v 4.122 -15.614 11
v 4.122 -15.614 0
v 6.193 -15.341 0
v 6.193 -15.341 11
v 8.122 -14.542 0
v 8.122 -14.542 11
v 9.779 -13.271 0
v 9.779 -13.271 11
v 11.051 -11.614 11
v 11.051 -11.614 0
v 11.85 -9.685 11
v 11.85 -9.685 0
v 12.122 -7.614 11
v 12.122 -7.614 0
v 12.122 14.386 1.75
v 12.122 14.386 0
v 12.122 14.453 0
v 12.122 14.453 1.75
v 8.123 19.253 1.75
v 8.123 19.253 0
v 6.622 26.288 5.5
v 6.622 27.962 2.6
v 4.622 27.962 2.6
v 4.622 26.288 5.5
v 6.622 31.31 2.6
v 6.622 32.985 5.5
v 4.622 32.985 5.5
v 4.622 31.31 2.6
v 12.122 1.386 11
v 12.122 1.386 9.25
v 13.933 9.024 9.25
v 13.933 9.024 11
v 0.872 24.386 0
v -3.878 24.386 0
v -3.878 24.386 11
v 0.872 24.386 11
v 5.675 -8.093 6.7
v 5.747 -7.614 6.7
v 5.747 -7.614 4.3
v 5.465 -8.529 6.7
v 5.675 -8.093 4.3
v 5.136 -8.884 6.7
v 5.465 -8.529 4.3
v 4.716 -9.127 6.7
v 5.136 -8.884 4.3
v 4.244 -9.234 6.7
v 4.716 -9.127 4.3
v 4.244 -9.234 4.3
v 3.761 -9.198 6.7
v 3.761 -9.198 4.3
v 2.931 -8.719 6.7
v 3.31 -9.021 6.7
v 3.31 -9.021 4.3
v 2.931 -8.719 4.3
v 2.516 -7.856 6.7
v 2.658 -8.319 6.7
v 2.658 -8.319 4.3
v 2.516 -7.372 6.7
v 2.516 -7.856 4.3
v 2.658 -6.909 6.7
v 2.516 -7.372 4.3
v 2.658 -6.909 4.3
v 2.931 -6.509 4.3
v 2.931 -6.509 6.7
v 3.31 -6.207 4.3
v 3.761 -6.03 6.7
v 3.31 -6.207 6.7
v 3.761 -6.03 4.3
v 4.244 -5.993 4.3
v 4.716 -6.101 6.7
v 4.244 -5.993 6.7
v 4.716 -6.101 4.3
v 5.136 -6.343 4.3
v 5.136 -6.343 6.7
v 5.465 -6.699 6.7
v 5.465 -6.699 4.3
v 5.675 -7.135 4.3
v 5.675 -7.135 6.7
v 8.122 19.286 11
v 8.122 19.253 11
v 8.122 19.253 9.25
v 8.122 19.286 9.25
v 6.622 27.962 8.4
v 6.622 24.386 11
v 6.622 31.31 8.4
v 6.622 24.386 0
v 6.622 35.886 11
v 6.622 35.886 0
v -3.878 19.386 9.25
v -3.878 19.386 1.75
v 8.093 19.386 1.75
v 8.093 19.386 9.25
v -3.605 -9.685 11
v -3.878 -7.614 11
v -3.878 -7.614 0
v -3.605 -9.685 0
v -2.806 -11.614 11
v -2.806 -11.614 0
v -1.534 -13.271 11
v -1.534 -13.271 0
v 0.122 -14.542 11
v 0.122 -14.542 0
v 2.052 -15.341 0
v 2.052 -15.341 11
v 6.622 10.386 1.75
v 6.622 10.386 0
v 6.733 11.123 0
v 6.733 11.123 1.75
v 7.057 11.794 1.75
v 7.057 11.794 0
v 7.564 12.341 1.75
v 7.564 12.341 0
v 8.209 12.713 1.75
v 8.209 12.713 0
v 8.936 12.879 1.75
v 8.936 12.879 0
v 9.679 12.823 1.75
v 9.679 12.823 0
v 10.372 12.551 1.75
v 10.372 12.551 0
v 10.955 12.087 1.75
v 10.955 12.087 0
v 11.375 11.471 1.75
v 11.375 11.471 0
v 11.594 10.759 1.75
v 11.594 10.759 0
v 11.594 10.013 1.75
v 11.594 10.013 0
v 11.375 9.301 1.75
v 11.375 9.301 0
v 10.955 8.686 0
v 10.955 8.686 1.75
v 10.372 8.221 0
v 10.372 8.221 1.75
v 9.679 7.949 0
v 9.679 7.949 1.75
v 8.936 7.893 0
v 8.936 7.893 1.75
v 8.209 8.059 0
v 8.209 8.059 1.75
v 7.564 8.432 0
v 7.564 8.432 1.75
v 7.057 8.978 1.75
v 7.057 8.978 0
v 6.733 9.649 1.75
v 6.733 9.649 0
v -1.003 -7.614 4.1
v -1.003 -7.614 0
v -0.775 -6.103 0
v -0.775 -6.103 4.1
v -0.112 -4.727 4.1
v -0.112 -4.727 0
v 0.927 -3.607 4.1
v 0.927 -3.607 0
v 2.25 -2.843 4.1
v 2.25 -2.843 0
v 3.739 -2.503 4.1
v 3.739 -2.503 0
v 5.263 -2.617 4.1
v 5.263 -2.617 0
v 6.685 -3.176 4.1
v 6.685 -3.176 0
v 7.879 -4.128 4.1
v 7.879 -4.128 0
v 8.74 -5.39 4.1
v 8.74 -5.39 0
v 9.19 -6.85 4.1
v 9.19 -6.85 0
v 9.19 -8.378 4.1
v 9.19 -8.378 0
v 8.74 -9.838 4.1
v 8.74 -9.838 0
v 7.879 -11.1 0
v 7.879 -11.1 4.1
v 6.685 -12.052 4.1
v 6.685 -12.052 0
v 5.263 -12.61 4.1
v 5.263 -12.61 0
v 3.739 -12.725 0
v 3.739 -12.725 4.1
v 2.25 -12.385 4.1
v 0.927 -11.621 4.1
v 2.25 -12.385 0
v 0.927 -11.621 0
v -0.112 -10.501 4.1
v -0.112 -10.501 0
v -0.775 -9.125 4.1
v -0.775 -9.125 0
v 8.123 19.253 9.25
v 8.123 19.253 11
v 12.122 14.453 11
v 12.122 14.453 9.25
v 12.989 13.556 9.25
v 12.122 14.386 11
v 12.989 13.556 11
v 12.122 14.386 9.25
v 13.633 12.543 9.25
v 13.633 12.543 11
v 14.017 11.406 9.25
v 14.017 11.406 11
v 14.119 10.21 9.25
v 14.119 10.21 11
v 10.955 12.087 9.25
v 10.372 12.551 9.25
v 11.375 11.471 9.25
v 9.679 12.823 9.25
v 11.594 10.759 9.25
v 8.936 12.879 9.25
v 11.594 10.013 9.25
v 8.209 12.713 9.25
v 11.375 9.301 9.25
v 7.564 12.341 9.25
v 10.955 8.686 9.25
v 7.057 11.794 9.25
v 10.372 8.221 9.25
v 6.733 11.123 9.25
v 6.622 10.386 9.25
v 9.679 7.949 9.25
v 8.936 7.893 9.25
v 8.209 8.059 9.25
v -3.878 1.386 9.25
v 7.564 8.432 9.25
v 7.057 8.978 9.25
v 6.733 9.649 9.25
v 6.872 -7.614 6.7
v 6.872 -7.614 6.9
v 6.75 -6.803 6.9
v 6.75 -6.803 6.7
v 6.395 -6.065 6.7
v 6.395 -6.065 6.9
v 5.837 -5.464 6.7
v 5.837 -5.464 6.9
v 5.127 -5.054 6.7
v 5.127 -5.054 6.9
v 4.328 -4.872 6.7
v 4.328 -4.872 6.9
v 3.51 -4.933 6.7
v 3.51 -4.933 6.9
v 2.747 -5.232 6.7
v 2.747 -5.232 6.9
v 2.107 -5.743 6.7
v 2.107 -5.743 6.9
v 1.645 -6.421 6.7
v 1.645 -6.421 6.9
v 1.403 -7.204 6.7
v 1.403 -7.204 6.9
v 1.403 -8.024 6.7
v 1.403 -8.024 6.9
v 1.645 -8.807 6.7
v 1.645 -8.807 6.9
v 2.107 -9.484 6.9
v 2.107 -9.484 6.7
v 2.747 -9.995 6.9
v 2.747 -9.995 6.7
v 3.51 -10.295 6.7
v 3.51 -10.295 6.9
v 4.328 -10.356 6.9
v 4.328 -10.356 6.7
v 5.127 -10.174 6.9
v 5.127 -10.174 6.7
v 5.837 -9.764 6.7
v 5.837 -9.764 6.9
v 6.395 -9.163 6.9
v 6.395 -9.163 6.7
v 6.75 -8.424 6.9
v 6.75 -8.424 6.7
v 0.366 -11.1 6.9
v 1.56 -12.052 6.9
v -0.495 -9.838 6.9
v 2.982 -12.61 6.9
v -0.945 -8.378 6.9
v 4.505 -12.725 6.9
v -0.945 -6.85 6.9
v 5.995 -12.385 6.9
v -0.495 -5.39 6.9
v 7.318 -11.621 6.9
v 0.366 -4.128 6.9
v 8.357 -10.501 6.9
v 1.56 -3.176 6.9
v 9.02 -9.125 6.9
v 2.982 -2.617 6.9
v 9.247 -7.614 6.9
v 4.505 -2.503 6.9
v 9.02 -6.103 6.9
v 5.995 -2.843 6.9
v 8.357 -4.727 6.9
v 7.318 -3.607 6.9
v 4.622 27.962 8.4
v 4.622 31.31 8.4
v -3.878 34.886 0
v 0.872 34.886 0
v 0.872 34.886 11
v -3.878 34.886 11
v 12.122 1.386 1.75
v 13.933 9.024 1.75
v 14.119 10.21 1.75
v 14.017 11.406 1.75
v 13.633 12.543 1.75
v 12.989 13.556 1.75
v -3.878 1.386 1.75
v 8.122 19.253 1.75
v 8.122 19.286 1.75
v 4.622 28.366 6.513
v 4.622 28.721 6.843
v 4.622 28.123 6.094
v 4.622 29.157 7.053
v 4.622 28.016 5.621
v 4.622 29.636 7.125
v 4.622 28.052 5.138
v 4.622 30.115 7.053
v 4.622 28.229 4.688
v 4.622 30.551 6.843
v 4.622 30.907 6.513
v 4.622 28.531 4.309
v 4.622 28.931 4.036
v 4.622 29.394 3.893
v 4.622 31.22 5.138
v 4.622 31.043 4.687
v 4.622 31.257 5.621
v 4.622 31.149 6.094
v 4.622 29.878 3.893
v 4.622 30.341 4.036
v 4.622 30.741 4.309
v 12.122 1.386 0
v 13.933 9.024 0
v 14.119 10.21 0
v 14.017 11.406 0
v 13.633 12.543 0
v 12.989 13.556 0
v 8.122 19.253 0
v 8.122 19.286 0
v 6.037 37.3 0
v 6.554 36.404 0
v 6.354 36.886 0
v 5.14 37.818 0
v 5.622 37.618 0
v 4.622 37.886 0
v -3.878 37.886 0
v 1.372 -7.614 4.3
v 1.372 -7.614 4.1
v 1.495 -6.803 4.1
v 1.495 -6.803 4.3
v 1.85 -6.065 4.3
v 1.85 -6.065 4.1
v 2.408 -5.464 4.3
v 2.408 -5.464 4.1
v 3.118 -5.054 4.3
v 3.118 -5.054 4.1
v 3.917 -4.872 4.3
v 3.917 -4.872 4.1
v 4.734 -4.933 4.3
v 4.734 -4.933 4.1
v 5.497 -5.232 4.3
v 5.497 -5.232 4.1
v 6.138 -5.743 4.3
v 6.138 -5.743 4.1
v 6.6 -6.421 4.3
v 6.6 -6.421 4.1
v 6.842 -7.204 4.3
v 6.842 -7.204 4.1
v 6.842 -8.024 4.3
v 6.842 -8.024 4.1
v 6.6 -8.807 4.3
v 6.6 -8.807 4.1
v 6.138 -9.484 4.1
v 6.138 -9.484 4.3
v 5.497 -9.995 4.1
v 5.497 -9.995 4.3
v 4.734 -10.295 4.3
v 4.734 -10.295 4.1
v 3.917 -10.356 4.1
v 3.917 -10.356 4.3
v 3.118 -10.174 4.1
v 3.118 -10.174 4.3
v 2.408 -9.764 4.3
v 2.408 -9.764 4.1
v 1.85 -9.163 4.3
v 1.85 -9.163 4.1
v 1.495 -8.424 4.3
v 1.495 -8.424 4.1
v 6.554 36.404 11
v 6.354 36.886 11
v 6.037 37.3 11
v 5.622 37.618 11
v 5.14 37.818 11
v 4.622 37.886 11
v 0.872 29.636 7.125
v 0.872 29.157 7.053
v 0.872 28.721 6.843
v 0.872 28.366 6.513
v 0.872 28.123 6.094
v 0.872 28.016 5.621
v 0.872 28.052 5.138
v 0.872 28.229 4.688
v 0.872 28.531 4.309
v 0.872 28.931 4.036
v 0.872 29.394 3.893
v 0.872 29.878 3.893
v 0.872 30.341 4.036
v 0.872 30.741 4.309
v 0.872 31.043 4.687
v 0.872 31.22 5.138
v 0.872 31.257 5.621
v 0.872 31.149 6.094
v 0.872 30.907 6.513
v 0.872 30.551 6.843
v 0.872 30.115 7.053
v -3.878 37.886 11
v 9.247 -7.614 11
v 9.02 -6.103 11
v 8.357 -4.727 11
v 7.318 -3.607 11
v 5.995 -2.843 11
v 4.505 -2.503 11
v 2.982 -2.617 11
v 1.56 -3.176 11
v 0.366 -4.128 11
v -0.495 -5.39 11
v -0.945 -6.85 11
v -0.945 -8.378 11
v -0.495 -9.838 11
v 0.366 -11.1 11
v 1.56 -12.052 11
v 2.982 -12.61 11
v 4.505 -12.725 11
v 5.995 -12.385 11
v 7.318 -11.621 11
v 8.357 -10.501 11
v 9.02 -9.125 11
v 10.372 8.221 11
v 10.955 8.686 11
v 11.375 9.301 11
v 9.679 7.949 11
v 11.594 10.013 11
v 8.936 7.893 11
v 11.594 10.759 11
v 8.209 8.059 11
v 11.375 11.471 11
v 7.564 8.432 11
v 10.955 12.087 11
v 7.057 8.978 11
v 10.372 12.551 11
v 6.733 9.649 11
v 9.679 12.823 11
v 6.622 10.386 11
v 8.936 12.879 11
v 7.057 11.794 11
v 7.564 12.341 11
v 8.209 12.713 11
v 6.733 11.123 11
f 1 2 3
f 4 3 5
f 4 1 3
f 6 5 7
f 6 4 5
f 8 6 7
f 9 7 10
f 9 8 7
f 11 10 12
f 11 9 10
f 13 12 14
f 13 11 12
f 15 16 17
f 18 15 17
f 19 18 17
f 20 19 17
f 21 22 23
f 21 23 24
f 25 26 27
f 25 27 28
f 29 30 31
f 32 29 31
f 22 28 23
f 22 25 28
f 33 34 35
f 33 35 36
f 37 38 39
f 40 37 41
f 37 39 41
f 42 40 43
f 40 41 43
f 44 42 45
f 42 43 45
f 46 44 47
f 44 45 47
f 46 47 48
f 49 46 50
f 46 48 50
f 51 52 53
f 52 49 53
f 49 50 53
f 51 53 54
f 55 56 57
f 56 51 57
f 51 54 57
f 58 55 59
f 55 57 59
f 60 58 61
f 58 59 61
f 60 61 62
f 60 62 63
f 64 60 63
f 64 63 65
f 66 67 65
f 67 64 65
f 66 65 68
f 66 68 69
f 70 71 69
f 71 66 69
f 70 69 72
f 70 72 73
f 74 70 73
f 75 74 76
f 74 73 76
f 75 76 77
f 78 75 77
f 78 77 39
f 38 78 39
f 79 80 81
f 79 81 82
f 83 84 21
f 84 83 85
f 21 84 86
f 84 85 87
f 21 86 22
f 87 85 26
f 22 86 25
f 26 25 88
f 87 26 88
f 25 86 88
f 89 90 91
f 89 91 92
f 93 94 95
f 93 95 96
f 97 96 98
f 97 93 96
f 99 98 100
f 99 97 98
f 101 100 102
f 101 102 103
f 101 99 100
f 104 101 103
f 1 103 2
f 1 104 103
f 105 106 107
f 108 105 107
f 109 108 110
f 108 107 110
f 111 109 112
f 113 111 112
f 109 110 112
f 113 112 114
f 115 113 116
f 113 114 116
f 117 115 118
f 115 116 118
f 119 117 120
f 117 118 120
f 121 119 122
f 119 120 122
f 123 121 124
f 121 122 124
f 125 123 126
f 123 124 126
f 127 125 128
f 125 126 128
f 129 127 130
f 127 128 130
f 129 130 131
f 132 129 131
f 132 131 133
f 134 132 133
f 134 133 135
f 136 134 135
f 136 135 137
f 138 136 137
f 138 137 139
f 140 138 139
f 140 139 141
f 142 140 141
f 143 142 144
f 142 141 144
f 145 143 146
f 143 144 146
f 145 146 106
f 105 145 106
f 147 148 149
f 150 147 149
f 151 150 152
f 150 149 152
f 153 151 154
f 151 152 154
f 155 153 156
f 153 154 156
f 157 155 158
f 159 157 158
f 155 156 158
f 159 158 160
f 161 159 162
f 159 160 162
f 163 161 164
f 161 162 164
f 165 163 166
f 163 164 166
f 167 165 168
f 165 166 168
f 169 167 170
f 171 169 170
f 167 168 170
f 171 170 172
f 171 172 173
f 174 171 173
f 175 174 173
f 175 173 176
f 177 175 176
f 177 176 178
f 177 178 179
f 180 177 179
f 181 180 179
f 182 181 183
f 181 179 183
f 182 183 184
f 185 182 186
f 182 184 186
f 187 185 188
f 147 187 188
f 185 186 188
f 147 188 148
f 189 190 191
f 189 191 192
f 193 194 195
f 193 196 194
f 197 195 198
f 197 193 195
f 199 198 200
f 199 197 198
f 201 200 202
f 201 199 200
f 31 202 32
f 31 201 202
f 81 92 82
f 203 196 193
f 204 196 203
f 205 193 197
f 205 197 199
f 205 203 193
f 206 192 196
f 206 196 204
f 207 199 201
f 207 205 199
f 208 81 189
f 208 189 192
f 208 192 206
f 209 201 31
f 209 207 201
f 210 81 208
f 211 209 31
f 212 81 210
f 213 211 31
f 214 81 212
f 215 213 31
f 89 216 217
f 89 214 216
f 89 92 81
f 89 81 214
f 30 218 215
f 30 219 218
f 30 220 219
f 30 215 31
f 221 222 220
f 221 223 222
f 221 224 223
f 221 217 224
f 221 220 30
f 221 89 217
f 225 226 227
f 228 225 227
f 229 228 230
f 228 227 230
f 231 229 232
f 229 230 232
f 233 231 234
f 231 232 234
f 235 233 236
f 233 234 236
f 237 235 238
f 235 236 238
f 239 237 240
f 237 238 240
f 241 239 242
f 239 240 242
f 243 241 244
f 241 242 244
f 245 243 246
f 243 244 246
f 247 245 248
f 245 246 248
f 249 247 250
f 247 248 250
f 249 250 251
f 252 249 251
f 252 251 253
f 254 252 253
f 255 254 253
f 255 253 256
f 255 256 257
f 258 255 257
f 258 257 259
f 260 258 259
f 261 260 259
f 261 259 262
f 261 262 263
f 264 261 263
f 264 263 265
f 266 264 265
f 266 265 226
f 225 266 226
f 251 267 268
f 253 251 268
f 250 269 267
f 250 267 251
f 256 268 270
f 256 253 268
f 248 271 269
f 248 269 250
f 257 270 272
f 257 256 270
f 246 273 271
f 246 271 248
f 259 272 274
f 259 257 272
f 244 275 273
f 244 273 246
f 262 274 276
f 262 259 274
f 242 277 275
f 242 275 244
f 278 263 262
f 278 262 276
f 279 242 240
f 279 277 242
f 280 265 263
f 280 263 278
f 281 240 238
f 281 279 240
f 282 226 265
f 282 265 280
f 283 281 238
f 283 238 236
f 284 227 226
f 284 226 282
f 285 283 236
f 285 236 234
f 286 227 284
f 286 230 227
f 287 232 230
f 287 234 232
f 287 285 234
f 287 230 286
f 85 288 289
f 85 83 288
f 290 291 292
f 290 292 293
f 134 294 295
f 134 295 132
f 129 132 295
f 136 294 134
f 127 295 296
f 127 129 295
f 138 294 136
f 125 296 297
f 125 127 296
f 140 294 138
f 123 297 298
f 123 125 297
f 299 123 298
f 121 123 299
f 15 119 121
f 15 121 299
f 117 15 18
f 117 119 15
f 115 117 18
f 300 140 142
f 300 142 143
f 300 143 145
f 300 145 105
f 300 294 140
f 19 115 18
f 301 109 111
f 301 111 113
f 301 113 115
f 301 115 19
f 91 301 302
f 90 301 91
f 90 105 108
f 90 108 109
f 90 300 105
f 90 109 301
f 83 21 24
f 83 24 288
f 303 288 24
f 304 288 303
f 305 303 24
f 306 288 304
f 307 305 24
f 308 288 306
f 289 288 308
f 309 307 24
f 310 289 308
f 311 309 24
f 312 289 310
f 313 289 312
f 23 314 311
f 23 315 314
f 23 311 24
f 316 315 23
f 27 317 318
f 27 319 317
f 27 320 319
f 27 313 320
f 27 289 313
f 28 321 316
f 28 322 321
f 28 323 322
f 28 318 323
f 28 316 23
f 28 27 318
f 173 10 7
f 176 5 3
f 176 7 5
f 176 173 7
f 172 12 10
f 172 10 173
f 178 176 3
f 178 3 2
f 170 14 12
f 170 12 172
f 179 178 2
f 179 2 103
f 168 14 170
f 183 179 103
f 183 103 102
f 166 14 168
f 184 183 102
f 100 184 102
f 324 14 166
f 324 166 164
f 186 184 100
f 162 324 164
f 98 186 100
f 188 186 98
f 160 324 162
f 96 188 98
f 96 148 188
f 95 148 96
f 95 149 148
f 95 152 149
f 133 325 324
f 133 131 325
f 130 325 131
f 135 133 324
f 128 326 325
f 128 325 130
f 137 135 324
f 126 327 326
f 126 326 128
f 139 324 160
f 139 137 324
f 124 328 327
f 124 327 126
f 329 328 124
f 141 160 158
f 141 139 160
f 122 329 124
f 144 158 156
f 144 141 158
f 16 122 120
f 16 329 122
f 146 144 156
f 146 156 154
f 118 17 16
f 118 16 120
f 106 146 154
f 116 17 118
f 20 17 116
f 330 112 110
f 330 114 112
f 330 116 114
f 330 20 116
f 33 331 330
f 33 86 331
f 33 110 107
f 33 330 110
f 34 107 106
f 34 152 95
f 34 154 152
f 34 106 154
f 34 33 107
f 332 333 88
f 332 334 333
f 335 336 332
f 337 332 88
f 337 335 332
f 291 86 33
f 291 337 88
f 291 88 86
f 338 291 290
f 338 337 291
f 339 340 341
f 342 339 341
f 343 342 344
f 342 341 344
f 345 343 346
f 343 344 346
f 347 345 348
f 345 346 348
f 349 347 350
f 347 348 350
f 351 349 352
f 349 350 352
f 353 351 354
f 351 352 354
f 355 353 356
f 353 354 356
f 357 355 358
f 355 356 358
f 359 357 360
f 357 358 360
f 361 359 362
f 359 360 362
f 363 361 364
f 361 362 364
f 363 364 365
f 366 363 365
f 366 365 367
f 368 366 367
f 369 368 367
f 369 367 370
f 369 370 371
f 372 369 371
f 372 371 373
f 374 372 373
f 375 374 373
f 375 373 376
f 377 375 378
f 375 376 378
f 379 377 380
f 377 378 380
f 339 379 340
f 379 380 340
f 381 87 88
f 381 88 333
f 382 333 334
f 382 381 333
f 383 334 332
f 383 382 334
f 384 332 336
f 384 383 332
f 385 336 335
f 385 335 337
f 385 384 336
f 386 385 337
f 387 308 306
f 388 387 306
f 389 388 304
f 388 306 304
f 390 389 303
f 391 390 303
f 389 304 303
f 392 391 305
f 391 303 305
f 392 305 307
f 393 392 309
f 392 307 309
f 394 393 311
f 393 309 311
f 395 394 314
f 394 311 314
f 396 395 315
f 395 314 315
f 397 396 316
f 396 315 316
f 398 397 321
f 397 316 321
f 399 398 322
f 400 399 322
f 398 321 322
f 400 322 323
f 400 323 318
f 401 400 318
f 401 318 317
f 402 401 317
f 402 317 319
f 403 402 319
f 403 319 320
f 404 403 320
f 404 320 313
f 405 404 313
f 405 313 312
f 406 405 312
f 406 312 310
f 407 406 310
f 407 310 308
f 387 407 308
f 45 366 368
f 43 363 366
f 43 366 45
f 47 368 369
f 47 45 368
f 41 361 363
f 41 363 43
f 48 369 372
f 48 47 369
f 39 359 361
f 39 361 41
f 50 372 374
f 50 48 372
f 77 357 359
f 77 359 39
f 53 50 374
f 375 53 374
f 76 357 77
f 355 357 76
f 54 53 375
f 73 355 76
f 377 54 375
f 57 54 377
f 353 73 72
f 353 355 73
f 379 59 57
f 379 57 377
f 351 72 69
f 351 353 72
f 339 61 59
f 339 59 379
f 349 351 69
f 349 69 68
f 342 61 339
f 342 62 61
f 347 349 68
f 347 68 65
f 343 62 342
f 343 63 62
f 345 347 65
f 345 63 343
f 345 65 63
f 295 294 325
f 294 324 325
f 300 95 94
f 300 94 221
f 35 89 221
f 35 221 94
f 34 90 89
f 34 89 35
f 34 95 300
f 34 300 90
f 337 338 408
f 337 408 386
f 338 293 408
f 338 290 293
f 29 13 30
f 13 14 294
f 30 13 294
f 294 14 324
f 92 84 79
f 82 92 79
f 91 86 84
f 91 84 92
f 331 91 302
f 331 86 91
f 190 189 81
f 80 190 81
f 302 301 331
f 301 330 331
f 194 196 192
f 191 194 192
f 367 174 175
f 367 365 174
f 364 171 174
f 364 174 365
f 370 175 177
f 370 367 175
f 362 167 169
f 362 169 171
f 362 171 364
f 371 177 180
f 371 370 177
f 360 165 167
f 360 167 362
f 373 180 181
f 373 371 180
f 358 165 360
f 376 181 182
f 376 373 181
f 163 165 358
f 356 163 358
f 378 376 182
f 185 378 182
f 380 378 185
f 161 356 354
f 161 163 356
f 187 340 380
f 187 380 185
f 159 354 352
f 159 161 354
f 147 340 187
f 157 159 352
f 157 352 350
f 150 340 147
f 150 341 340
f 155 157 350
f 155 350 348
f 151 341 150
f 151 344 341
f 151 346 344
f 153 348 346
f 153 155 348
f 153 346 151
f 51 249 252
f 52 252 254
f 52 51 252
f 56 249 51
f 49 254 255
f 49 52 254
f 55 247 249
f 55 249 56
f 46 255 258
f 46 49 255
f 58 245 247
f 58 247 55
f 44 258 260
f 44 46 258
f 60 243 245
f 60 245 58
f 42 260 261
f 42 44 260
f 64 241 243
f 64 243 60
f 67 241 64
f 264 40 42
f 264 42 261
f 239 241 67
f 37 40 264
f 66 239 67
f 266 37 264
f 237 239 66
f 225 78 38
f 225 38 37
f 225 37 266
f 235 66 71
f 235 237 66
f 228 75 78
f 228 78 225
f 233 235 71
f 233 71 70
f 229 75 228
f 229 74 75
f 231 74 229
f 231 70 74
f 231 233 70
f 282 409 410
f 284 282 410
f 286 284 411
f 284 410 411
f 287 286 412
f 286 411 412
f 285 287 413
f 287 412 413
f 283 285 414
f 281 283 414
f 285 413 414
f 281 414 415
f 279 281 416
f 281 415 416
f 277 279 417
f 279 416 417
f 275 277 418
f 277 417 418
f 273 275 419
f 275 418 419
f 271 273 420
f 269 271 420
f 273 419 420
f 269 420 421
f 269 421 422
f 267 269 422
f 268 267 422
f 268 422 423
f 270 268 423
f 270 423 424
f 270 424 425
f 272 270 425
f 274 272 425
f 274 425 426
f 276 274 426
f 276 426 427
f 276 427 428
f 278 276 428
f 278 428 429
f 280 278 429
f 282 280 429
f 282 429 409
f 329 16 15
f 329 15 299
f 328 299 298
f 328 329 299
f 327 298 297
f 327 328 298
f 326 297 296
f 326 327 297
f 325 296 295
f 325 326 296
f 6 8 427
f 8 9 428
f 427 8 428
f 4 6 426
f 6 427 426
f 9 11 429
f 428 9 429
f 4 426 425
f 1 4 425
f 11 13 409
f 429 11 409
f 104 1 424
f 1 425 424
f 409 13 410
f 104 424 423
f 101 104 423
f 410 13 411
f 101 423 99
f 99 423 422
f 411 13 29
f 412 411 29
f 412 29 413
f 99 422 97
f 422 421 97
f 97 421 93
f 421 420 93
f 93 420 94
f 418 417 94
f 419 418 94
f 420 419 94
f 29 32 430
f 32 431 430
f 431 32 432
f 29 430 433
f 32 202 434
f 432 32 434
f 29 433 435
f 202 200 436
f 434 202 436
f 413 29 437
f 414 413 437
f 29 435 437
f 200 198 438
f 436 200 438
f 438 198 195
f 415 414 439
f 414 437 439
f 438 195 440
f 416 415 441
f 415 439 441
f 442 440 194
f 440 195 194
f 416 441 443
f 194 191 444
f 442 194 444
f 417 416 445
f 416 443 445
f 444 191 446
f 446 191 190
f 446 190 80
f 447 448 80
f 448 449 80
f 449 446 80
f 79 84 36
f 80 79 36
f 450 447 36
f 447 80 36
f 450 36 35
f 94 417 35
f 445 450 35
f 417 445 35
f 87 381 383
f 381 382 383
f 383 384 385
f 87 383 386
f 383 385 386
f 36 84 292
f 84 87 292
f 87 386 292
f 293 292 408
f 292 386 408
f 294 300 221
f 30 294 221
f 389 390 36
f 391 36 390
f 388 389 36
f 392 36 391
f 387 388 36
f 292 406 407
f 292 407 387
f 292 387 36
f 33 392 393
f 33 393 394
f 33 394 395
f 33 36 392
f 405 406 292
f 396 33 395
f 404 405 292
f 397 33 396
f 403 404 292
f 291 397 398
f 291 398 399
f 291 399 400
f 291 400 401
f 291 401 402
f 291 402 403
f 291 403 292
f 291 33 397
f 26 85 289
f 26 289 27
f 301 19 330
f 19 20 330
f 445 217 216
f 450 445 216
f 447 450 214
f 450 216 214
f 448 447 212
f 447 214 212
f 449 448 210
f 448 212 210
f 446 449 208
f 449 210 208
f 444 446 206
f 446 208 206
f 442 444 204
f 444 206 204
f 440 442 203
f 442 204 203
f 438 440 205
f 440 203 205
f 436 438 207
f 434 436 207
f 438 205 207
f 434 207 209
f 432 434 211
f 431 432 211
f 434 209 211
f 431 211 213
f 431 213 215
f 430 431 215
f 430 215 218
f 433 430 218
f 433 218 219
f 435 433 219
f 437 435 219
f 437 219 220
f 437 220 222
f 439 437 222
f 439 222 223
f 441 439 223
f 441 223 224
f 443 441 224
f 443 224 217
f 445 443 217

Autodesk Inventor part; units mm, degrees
ref_plane "YZ Plane" through (0, 0, 0) normal (1, 0, 0) x (0, 1, 0)
ref_plane "XZ Plane" through (0, 0, 0) normal (0, 1, 0) x (-1, 0, 0)
ref_plane "XY Plane" through (0, 0, 0) normal (0, 0, 1) x (1, 0, 0)
sketch "Szkic1" plane through (0, 0, 0) normal (0, 0, 1) x (1, 0, 0)
  line L0 (-3.8776, -15.6139) -> (12.1224, -15.6139)
  line L1 (12.1224, -15.6139) -> (12.1224, 24.3861)
  line L2 (-3.8776, -15.6139) -> (-3.8776, 24.3861)
  line L3 (-3.8776, 24.3861) -> (12.1224, 24.3861)
  circle A0 centre (4.1224, -7.6139) radius 5.075
  circle A1 centre (4.1224, -7.6139) radius 1.625
  point P0 (0, 0)
  dimension "d0" = 16
  dimension "d1" = 40
  dimension "d2" = 8
  dimension "d3" = 10.15
  dimension "d4" = 8
  dimension "d8" = 3.25
extrude "Wyciągnięcie proste1" add sketch "Szkic1" along normal blind 11 contours L2 L3 L1 L0 | A0
fillet "Zaokrąglenie1" radius 8 2 edges at (-3.8776, -15.6139, 5.5) (12.1224, -15.6139, 5.5)
sketch "Szkic2" plane through (0, 0, 0) normal (0, 0, -1) x (-1, 0, 0)
  arc A0 (-12.1224, -7.6139) -> (3.8776, -7.6139) centre (-4.1224, -7.6139) ccw projected
  line L0 (-4.1224, -15.6139) -> (-13.9839, -15.6139)
  line L1 (3.8776, 24.3861) -> (3.8776, -7.6139) projected
  circle A1 centre (-9.1224, 10.3861) radius 2.5
  arc A2 (-12.1224, 14.3861) -> (-12.1224, 6.3861) centre (-9.1224, 10.3861) ccw
  arc A3 (-12.1224, -7.6139) -> (3.8776, -7.6139) centre (-4.1224, -7.6139) ccw projected
  line L2 (3.8776, 24.3861) -> (3.8776, -7.6139) projected
  line L3 (-12.1224, 24.3861) -> (3.8776, 24.3861) projected
  line L4 (-12.1224, -7.6139) -> (-12.1224, 24.3861) projected
  line L5 (-12.1224, -7.6139) -> (-12.1224, 24.3861) projected
  line L6 (-12.1224, 19.2527) -> (-8.1224, 19.2527)
  line L7 (-8.1224, 19.2527) -> (-8.1224, 24.3861)
  line L8 (-12.1224, 24.3861) -> (3.8776, 24.3861) projected
  point P0 (0, 0)
  dimension "d10" = 26
  dimension "d13" = 5
  dimension "d14" = 10
  dimension "d16" = 4
  dimension "d23" = 13
extrude "Wyciągnięcie proste2" add sketch "Szkic2" against normal blind 11 contours A2 L4
extrude "Wyciągnięcie proste3" cut sketch "Szkic2" against normal blind 11.5 contours L4 L3 L7 L6
extrude "Wyciągnięcie proste4" cut sketch "Szkic2" against normal blind 11.5 contours A1
sketch "Szkic3" plane through (-3.8776, 24.3861, 0) normal (-1, 0, 0) x (0, 0, 1)
  line L0 (11, -32) -> (0, -32) projected
  line L1 (11, 0) -> (11, -32) projected
  line L2 (0, 0) -> (11, 0) projected
  line L3 (0, 0) -> (0, -32) projected
  line L4 (1.75, -23) -> (9.25, -23)
  line L5 (1.75, -23) -> (1.75, -5)
  line L6 (1.75, -5) -> (9.25, -5)
  line L7 (9.25, -5) -> (9.25, -23)
  point P0 (0, -24.3861)
  point P1 (5.75, -14)
  dimension "d24" = 14
  dimension "d26" = 9
  dimension "d27" = 7.5
  dimension "d28" = 11
  dimension "d29" = 18
  dimension "d30" = 1.75
extrude "Wyciągnięcie proste5" cut sketch "Szkic3" against normal blind 20 contours L5 L6 L7 L4
chamfer "Faza3" distance 1.5 distance2 5.1 1 edges at (8.1224, 24.3861, 5.5)
sketch "Szkic5" plane through (0, 0, 0) normal (0, 0, -1) x (-1, 0, 0)
  circle A0 centre (-4.1224, -7.6139) radius 1.625 projected
  circle A1 centre (-4.1224, -7.6139) radius 5.125
  circle A2 centre (-4.1224, -7.6139) radius 2.75
  point P0 (0, 0)
  dimension "d45" = 10.25
  dimension "d64" = 5.5
extrude "Wyciągnięcie proste7" cut sketch "Szkic5" against normal blind 4.1 contours A1 | A2
sketch "Szkic6" plane through (0, 0, 11) normal (0, 0, 1) x (1, 0, 0)
  circle A0 centre (4.1224, -7.6139) radius 5.125 projected
  circle A1 centre (4.1224, -7.6139) radius 1.625 projected
  circle A2 centre (4.1224, -7.6139) radius 2.75
  point P0 (0, 0)
  dimension "d67" = 5.5
extrude "Wyciągnięcie proste8" cut sketch "Szkic6" against normal blind 4.1 contours A0 | A2
sketch "Szkic7" plane through (0, 0, 0) normal (0, 0, -1) x (-1, 0, 0)
  circle A0 centre (-4.1224, -7.6139) radius 5.125 projected
  line L0 (-8.1224, 19.2861) -> (-6.6224, 24.3861) projected
  line L1 (-8.1224, 19.2861) -> (-8.1224, 19.2527) projected
  line L2 (-12.1224, 14.3861) -> (-12.1224, 19.2527) projected
  arc A1 (-12.1224, 14.3861) -> (-12.1224, 6.3861) centre (-9.1224, 10.3861) ccw projected
  arc A2 (-12.1224, -7.6139) -> (3.8776, -7.6139) centre (-4.1224, -7.6139) ccw projected
  line L3 (3.8776, 24.3861) -> (3.8776, -7.6139) projected
  line L4 (-6.6224, 24.3861) -> (3.8776, 24.3861) projected
  circle A3 centre (-9.1224, 10.3861) radius 2.5 projected
  line L5 (-6.6224, 24.3861) -> (-6.6224, 37.8861)
  line L6 (-0.8724, 24.3861) -> (-0.8724, 34.8861)
  line L7 (-0.8724, 34.8861) -> (3.8776, 34.8861)
  line L8 (3.8776, 34.8861) -> (3.8776, 37.8861)
  line L9 (3.8776, 37.8861) -> (-6.6224, 37.8861)
  line L10 (-8.1224, 19.2527) -> (-12.1224, 19.2527) projected
  line L11 (-12.1224, -7.6139) -> (-12.1224, 6.3861) projected
  point P0 (0, 0)
  dimension "d50" = 13.5
  dimension "d52" = 5.75
  dimension "d53" = 10.5
extrude "Wyciągnięcie proste9" add sketch "Szkic7" against normal blind 11 contours L5 L9 L8 L7 L6 L4
fillet "Zaokrąglenie2" radius 2 1 edges at (6.6224, 37.8861, 5.5)
chamfer "Faza4" distance 4.8 distance2 4 1 edges at (12.1224, 19.2527, 0.875) measured on face at (12.1224, 16.0083, 0.5833)
chamfer "Faza5" distance 4.8 distance2 4 1 edges at (12.1224, 19.2527, 10.125) measured on face at (12.1224, 16.0083, 9.8333)
extrude "Wyciągnięcie proste10" cut sketch "Szkic5" against normal blind 4.3 contours A2
extrude "Wyciągnięcie proste11" cut sketch "Szkic6" against normal blind 4.3 contours A2
sketch "Szkic9" plane through (0.8724, 24.3861, 0) normal (-1, 0, 0) x (0, 0, 1)
  line L0 (0, 0) -> (0, 10.5) projected
  line L1 (11, 0) -> (0, 0) projected
  line L2 (11, 10.5) -> (11, 0) projected
  line L3 (0, 10.5) -> (11, 10.5) projected
  point P0 (0, -24.3861)
  point P1 (5.5, 5.25)
  dimension "d73" = 5.5
  dimension "d74" = 11
  dimension "d75" = 5.25
  dimension "d76" = 10.5
hole "Otwór1" at (0.8724, 29.6361, 5.5) direction (1, 0, 0) diameter 3.25 end through all
sketch "Szkic10" plane through (6.6224, 24.3861, 11) normal (1, 0, 0) x (0, 0, -1)
  circle A0 centre (5.5, 5.25) radius 1.625 projected
  line L0 (0, 11.5) -> (11, 11.5) projected
  line L1 (0, 0) -> (0, 11.5) projected
  line L2 (11, 0) -> (0, 0) projected
  line L3 (11, 11.5) -> (11, 0) projected
  line L4 (8.4, 3.5757) -> (5.5, 1.9014)
  line L5 (5.5, 1.9014) -> (2.6, 3.5757)
  line L6 (2.6, 3.5757) -> (2.6, 6.9243)
  line L7 (2.6, 6.9243) -> (5.5, 8.5986)
  line L8 (5.5, 8.5986) -> (8.4, 6.9243)
  line L9 (8.4, 6.9243) -> (8.4, 3.5757)
  point P0 (11, -24.3861)
  point P1 (8.4, 5.25)
extrude "Wyciągnięcie proste13" cut sketch "Szkic10" against normal blind 2 contours L4 L5 L6 L7 L8 L9
chamfer "Faza6" distance 5 distance2 3.2 1 edges at (12.1224, 6.3861, 0.875)
chamfer "Faza7" [suppressed]
equation "\"d2\" = 0.5 * d0"
equation "\"d26\" = d25"
equation "\"d30\" = -0.5 * d27 + 0.5 * d28"
equation "\"d73\" = 0.5 * d74"
equation "\"d75\" = 0.5 * d76"
equation "\"d25\" = 9"
properties part number "3DP_ABS_Extruder_Tensioning_Arm"
